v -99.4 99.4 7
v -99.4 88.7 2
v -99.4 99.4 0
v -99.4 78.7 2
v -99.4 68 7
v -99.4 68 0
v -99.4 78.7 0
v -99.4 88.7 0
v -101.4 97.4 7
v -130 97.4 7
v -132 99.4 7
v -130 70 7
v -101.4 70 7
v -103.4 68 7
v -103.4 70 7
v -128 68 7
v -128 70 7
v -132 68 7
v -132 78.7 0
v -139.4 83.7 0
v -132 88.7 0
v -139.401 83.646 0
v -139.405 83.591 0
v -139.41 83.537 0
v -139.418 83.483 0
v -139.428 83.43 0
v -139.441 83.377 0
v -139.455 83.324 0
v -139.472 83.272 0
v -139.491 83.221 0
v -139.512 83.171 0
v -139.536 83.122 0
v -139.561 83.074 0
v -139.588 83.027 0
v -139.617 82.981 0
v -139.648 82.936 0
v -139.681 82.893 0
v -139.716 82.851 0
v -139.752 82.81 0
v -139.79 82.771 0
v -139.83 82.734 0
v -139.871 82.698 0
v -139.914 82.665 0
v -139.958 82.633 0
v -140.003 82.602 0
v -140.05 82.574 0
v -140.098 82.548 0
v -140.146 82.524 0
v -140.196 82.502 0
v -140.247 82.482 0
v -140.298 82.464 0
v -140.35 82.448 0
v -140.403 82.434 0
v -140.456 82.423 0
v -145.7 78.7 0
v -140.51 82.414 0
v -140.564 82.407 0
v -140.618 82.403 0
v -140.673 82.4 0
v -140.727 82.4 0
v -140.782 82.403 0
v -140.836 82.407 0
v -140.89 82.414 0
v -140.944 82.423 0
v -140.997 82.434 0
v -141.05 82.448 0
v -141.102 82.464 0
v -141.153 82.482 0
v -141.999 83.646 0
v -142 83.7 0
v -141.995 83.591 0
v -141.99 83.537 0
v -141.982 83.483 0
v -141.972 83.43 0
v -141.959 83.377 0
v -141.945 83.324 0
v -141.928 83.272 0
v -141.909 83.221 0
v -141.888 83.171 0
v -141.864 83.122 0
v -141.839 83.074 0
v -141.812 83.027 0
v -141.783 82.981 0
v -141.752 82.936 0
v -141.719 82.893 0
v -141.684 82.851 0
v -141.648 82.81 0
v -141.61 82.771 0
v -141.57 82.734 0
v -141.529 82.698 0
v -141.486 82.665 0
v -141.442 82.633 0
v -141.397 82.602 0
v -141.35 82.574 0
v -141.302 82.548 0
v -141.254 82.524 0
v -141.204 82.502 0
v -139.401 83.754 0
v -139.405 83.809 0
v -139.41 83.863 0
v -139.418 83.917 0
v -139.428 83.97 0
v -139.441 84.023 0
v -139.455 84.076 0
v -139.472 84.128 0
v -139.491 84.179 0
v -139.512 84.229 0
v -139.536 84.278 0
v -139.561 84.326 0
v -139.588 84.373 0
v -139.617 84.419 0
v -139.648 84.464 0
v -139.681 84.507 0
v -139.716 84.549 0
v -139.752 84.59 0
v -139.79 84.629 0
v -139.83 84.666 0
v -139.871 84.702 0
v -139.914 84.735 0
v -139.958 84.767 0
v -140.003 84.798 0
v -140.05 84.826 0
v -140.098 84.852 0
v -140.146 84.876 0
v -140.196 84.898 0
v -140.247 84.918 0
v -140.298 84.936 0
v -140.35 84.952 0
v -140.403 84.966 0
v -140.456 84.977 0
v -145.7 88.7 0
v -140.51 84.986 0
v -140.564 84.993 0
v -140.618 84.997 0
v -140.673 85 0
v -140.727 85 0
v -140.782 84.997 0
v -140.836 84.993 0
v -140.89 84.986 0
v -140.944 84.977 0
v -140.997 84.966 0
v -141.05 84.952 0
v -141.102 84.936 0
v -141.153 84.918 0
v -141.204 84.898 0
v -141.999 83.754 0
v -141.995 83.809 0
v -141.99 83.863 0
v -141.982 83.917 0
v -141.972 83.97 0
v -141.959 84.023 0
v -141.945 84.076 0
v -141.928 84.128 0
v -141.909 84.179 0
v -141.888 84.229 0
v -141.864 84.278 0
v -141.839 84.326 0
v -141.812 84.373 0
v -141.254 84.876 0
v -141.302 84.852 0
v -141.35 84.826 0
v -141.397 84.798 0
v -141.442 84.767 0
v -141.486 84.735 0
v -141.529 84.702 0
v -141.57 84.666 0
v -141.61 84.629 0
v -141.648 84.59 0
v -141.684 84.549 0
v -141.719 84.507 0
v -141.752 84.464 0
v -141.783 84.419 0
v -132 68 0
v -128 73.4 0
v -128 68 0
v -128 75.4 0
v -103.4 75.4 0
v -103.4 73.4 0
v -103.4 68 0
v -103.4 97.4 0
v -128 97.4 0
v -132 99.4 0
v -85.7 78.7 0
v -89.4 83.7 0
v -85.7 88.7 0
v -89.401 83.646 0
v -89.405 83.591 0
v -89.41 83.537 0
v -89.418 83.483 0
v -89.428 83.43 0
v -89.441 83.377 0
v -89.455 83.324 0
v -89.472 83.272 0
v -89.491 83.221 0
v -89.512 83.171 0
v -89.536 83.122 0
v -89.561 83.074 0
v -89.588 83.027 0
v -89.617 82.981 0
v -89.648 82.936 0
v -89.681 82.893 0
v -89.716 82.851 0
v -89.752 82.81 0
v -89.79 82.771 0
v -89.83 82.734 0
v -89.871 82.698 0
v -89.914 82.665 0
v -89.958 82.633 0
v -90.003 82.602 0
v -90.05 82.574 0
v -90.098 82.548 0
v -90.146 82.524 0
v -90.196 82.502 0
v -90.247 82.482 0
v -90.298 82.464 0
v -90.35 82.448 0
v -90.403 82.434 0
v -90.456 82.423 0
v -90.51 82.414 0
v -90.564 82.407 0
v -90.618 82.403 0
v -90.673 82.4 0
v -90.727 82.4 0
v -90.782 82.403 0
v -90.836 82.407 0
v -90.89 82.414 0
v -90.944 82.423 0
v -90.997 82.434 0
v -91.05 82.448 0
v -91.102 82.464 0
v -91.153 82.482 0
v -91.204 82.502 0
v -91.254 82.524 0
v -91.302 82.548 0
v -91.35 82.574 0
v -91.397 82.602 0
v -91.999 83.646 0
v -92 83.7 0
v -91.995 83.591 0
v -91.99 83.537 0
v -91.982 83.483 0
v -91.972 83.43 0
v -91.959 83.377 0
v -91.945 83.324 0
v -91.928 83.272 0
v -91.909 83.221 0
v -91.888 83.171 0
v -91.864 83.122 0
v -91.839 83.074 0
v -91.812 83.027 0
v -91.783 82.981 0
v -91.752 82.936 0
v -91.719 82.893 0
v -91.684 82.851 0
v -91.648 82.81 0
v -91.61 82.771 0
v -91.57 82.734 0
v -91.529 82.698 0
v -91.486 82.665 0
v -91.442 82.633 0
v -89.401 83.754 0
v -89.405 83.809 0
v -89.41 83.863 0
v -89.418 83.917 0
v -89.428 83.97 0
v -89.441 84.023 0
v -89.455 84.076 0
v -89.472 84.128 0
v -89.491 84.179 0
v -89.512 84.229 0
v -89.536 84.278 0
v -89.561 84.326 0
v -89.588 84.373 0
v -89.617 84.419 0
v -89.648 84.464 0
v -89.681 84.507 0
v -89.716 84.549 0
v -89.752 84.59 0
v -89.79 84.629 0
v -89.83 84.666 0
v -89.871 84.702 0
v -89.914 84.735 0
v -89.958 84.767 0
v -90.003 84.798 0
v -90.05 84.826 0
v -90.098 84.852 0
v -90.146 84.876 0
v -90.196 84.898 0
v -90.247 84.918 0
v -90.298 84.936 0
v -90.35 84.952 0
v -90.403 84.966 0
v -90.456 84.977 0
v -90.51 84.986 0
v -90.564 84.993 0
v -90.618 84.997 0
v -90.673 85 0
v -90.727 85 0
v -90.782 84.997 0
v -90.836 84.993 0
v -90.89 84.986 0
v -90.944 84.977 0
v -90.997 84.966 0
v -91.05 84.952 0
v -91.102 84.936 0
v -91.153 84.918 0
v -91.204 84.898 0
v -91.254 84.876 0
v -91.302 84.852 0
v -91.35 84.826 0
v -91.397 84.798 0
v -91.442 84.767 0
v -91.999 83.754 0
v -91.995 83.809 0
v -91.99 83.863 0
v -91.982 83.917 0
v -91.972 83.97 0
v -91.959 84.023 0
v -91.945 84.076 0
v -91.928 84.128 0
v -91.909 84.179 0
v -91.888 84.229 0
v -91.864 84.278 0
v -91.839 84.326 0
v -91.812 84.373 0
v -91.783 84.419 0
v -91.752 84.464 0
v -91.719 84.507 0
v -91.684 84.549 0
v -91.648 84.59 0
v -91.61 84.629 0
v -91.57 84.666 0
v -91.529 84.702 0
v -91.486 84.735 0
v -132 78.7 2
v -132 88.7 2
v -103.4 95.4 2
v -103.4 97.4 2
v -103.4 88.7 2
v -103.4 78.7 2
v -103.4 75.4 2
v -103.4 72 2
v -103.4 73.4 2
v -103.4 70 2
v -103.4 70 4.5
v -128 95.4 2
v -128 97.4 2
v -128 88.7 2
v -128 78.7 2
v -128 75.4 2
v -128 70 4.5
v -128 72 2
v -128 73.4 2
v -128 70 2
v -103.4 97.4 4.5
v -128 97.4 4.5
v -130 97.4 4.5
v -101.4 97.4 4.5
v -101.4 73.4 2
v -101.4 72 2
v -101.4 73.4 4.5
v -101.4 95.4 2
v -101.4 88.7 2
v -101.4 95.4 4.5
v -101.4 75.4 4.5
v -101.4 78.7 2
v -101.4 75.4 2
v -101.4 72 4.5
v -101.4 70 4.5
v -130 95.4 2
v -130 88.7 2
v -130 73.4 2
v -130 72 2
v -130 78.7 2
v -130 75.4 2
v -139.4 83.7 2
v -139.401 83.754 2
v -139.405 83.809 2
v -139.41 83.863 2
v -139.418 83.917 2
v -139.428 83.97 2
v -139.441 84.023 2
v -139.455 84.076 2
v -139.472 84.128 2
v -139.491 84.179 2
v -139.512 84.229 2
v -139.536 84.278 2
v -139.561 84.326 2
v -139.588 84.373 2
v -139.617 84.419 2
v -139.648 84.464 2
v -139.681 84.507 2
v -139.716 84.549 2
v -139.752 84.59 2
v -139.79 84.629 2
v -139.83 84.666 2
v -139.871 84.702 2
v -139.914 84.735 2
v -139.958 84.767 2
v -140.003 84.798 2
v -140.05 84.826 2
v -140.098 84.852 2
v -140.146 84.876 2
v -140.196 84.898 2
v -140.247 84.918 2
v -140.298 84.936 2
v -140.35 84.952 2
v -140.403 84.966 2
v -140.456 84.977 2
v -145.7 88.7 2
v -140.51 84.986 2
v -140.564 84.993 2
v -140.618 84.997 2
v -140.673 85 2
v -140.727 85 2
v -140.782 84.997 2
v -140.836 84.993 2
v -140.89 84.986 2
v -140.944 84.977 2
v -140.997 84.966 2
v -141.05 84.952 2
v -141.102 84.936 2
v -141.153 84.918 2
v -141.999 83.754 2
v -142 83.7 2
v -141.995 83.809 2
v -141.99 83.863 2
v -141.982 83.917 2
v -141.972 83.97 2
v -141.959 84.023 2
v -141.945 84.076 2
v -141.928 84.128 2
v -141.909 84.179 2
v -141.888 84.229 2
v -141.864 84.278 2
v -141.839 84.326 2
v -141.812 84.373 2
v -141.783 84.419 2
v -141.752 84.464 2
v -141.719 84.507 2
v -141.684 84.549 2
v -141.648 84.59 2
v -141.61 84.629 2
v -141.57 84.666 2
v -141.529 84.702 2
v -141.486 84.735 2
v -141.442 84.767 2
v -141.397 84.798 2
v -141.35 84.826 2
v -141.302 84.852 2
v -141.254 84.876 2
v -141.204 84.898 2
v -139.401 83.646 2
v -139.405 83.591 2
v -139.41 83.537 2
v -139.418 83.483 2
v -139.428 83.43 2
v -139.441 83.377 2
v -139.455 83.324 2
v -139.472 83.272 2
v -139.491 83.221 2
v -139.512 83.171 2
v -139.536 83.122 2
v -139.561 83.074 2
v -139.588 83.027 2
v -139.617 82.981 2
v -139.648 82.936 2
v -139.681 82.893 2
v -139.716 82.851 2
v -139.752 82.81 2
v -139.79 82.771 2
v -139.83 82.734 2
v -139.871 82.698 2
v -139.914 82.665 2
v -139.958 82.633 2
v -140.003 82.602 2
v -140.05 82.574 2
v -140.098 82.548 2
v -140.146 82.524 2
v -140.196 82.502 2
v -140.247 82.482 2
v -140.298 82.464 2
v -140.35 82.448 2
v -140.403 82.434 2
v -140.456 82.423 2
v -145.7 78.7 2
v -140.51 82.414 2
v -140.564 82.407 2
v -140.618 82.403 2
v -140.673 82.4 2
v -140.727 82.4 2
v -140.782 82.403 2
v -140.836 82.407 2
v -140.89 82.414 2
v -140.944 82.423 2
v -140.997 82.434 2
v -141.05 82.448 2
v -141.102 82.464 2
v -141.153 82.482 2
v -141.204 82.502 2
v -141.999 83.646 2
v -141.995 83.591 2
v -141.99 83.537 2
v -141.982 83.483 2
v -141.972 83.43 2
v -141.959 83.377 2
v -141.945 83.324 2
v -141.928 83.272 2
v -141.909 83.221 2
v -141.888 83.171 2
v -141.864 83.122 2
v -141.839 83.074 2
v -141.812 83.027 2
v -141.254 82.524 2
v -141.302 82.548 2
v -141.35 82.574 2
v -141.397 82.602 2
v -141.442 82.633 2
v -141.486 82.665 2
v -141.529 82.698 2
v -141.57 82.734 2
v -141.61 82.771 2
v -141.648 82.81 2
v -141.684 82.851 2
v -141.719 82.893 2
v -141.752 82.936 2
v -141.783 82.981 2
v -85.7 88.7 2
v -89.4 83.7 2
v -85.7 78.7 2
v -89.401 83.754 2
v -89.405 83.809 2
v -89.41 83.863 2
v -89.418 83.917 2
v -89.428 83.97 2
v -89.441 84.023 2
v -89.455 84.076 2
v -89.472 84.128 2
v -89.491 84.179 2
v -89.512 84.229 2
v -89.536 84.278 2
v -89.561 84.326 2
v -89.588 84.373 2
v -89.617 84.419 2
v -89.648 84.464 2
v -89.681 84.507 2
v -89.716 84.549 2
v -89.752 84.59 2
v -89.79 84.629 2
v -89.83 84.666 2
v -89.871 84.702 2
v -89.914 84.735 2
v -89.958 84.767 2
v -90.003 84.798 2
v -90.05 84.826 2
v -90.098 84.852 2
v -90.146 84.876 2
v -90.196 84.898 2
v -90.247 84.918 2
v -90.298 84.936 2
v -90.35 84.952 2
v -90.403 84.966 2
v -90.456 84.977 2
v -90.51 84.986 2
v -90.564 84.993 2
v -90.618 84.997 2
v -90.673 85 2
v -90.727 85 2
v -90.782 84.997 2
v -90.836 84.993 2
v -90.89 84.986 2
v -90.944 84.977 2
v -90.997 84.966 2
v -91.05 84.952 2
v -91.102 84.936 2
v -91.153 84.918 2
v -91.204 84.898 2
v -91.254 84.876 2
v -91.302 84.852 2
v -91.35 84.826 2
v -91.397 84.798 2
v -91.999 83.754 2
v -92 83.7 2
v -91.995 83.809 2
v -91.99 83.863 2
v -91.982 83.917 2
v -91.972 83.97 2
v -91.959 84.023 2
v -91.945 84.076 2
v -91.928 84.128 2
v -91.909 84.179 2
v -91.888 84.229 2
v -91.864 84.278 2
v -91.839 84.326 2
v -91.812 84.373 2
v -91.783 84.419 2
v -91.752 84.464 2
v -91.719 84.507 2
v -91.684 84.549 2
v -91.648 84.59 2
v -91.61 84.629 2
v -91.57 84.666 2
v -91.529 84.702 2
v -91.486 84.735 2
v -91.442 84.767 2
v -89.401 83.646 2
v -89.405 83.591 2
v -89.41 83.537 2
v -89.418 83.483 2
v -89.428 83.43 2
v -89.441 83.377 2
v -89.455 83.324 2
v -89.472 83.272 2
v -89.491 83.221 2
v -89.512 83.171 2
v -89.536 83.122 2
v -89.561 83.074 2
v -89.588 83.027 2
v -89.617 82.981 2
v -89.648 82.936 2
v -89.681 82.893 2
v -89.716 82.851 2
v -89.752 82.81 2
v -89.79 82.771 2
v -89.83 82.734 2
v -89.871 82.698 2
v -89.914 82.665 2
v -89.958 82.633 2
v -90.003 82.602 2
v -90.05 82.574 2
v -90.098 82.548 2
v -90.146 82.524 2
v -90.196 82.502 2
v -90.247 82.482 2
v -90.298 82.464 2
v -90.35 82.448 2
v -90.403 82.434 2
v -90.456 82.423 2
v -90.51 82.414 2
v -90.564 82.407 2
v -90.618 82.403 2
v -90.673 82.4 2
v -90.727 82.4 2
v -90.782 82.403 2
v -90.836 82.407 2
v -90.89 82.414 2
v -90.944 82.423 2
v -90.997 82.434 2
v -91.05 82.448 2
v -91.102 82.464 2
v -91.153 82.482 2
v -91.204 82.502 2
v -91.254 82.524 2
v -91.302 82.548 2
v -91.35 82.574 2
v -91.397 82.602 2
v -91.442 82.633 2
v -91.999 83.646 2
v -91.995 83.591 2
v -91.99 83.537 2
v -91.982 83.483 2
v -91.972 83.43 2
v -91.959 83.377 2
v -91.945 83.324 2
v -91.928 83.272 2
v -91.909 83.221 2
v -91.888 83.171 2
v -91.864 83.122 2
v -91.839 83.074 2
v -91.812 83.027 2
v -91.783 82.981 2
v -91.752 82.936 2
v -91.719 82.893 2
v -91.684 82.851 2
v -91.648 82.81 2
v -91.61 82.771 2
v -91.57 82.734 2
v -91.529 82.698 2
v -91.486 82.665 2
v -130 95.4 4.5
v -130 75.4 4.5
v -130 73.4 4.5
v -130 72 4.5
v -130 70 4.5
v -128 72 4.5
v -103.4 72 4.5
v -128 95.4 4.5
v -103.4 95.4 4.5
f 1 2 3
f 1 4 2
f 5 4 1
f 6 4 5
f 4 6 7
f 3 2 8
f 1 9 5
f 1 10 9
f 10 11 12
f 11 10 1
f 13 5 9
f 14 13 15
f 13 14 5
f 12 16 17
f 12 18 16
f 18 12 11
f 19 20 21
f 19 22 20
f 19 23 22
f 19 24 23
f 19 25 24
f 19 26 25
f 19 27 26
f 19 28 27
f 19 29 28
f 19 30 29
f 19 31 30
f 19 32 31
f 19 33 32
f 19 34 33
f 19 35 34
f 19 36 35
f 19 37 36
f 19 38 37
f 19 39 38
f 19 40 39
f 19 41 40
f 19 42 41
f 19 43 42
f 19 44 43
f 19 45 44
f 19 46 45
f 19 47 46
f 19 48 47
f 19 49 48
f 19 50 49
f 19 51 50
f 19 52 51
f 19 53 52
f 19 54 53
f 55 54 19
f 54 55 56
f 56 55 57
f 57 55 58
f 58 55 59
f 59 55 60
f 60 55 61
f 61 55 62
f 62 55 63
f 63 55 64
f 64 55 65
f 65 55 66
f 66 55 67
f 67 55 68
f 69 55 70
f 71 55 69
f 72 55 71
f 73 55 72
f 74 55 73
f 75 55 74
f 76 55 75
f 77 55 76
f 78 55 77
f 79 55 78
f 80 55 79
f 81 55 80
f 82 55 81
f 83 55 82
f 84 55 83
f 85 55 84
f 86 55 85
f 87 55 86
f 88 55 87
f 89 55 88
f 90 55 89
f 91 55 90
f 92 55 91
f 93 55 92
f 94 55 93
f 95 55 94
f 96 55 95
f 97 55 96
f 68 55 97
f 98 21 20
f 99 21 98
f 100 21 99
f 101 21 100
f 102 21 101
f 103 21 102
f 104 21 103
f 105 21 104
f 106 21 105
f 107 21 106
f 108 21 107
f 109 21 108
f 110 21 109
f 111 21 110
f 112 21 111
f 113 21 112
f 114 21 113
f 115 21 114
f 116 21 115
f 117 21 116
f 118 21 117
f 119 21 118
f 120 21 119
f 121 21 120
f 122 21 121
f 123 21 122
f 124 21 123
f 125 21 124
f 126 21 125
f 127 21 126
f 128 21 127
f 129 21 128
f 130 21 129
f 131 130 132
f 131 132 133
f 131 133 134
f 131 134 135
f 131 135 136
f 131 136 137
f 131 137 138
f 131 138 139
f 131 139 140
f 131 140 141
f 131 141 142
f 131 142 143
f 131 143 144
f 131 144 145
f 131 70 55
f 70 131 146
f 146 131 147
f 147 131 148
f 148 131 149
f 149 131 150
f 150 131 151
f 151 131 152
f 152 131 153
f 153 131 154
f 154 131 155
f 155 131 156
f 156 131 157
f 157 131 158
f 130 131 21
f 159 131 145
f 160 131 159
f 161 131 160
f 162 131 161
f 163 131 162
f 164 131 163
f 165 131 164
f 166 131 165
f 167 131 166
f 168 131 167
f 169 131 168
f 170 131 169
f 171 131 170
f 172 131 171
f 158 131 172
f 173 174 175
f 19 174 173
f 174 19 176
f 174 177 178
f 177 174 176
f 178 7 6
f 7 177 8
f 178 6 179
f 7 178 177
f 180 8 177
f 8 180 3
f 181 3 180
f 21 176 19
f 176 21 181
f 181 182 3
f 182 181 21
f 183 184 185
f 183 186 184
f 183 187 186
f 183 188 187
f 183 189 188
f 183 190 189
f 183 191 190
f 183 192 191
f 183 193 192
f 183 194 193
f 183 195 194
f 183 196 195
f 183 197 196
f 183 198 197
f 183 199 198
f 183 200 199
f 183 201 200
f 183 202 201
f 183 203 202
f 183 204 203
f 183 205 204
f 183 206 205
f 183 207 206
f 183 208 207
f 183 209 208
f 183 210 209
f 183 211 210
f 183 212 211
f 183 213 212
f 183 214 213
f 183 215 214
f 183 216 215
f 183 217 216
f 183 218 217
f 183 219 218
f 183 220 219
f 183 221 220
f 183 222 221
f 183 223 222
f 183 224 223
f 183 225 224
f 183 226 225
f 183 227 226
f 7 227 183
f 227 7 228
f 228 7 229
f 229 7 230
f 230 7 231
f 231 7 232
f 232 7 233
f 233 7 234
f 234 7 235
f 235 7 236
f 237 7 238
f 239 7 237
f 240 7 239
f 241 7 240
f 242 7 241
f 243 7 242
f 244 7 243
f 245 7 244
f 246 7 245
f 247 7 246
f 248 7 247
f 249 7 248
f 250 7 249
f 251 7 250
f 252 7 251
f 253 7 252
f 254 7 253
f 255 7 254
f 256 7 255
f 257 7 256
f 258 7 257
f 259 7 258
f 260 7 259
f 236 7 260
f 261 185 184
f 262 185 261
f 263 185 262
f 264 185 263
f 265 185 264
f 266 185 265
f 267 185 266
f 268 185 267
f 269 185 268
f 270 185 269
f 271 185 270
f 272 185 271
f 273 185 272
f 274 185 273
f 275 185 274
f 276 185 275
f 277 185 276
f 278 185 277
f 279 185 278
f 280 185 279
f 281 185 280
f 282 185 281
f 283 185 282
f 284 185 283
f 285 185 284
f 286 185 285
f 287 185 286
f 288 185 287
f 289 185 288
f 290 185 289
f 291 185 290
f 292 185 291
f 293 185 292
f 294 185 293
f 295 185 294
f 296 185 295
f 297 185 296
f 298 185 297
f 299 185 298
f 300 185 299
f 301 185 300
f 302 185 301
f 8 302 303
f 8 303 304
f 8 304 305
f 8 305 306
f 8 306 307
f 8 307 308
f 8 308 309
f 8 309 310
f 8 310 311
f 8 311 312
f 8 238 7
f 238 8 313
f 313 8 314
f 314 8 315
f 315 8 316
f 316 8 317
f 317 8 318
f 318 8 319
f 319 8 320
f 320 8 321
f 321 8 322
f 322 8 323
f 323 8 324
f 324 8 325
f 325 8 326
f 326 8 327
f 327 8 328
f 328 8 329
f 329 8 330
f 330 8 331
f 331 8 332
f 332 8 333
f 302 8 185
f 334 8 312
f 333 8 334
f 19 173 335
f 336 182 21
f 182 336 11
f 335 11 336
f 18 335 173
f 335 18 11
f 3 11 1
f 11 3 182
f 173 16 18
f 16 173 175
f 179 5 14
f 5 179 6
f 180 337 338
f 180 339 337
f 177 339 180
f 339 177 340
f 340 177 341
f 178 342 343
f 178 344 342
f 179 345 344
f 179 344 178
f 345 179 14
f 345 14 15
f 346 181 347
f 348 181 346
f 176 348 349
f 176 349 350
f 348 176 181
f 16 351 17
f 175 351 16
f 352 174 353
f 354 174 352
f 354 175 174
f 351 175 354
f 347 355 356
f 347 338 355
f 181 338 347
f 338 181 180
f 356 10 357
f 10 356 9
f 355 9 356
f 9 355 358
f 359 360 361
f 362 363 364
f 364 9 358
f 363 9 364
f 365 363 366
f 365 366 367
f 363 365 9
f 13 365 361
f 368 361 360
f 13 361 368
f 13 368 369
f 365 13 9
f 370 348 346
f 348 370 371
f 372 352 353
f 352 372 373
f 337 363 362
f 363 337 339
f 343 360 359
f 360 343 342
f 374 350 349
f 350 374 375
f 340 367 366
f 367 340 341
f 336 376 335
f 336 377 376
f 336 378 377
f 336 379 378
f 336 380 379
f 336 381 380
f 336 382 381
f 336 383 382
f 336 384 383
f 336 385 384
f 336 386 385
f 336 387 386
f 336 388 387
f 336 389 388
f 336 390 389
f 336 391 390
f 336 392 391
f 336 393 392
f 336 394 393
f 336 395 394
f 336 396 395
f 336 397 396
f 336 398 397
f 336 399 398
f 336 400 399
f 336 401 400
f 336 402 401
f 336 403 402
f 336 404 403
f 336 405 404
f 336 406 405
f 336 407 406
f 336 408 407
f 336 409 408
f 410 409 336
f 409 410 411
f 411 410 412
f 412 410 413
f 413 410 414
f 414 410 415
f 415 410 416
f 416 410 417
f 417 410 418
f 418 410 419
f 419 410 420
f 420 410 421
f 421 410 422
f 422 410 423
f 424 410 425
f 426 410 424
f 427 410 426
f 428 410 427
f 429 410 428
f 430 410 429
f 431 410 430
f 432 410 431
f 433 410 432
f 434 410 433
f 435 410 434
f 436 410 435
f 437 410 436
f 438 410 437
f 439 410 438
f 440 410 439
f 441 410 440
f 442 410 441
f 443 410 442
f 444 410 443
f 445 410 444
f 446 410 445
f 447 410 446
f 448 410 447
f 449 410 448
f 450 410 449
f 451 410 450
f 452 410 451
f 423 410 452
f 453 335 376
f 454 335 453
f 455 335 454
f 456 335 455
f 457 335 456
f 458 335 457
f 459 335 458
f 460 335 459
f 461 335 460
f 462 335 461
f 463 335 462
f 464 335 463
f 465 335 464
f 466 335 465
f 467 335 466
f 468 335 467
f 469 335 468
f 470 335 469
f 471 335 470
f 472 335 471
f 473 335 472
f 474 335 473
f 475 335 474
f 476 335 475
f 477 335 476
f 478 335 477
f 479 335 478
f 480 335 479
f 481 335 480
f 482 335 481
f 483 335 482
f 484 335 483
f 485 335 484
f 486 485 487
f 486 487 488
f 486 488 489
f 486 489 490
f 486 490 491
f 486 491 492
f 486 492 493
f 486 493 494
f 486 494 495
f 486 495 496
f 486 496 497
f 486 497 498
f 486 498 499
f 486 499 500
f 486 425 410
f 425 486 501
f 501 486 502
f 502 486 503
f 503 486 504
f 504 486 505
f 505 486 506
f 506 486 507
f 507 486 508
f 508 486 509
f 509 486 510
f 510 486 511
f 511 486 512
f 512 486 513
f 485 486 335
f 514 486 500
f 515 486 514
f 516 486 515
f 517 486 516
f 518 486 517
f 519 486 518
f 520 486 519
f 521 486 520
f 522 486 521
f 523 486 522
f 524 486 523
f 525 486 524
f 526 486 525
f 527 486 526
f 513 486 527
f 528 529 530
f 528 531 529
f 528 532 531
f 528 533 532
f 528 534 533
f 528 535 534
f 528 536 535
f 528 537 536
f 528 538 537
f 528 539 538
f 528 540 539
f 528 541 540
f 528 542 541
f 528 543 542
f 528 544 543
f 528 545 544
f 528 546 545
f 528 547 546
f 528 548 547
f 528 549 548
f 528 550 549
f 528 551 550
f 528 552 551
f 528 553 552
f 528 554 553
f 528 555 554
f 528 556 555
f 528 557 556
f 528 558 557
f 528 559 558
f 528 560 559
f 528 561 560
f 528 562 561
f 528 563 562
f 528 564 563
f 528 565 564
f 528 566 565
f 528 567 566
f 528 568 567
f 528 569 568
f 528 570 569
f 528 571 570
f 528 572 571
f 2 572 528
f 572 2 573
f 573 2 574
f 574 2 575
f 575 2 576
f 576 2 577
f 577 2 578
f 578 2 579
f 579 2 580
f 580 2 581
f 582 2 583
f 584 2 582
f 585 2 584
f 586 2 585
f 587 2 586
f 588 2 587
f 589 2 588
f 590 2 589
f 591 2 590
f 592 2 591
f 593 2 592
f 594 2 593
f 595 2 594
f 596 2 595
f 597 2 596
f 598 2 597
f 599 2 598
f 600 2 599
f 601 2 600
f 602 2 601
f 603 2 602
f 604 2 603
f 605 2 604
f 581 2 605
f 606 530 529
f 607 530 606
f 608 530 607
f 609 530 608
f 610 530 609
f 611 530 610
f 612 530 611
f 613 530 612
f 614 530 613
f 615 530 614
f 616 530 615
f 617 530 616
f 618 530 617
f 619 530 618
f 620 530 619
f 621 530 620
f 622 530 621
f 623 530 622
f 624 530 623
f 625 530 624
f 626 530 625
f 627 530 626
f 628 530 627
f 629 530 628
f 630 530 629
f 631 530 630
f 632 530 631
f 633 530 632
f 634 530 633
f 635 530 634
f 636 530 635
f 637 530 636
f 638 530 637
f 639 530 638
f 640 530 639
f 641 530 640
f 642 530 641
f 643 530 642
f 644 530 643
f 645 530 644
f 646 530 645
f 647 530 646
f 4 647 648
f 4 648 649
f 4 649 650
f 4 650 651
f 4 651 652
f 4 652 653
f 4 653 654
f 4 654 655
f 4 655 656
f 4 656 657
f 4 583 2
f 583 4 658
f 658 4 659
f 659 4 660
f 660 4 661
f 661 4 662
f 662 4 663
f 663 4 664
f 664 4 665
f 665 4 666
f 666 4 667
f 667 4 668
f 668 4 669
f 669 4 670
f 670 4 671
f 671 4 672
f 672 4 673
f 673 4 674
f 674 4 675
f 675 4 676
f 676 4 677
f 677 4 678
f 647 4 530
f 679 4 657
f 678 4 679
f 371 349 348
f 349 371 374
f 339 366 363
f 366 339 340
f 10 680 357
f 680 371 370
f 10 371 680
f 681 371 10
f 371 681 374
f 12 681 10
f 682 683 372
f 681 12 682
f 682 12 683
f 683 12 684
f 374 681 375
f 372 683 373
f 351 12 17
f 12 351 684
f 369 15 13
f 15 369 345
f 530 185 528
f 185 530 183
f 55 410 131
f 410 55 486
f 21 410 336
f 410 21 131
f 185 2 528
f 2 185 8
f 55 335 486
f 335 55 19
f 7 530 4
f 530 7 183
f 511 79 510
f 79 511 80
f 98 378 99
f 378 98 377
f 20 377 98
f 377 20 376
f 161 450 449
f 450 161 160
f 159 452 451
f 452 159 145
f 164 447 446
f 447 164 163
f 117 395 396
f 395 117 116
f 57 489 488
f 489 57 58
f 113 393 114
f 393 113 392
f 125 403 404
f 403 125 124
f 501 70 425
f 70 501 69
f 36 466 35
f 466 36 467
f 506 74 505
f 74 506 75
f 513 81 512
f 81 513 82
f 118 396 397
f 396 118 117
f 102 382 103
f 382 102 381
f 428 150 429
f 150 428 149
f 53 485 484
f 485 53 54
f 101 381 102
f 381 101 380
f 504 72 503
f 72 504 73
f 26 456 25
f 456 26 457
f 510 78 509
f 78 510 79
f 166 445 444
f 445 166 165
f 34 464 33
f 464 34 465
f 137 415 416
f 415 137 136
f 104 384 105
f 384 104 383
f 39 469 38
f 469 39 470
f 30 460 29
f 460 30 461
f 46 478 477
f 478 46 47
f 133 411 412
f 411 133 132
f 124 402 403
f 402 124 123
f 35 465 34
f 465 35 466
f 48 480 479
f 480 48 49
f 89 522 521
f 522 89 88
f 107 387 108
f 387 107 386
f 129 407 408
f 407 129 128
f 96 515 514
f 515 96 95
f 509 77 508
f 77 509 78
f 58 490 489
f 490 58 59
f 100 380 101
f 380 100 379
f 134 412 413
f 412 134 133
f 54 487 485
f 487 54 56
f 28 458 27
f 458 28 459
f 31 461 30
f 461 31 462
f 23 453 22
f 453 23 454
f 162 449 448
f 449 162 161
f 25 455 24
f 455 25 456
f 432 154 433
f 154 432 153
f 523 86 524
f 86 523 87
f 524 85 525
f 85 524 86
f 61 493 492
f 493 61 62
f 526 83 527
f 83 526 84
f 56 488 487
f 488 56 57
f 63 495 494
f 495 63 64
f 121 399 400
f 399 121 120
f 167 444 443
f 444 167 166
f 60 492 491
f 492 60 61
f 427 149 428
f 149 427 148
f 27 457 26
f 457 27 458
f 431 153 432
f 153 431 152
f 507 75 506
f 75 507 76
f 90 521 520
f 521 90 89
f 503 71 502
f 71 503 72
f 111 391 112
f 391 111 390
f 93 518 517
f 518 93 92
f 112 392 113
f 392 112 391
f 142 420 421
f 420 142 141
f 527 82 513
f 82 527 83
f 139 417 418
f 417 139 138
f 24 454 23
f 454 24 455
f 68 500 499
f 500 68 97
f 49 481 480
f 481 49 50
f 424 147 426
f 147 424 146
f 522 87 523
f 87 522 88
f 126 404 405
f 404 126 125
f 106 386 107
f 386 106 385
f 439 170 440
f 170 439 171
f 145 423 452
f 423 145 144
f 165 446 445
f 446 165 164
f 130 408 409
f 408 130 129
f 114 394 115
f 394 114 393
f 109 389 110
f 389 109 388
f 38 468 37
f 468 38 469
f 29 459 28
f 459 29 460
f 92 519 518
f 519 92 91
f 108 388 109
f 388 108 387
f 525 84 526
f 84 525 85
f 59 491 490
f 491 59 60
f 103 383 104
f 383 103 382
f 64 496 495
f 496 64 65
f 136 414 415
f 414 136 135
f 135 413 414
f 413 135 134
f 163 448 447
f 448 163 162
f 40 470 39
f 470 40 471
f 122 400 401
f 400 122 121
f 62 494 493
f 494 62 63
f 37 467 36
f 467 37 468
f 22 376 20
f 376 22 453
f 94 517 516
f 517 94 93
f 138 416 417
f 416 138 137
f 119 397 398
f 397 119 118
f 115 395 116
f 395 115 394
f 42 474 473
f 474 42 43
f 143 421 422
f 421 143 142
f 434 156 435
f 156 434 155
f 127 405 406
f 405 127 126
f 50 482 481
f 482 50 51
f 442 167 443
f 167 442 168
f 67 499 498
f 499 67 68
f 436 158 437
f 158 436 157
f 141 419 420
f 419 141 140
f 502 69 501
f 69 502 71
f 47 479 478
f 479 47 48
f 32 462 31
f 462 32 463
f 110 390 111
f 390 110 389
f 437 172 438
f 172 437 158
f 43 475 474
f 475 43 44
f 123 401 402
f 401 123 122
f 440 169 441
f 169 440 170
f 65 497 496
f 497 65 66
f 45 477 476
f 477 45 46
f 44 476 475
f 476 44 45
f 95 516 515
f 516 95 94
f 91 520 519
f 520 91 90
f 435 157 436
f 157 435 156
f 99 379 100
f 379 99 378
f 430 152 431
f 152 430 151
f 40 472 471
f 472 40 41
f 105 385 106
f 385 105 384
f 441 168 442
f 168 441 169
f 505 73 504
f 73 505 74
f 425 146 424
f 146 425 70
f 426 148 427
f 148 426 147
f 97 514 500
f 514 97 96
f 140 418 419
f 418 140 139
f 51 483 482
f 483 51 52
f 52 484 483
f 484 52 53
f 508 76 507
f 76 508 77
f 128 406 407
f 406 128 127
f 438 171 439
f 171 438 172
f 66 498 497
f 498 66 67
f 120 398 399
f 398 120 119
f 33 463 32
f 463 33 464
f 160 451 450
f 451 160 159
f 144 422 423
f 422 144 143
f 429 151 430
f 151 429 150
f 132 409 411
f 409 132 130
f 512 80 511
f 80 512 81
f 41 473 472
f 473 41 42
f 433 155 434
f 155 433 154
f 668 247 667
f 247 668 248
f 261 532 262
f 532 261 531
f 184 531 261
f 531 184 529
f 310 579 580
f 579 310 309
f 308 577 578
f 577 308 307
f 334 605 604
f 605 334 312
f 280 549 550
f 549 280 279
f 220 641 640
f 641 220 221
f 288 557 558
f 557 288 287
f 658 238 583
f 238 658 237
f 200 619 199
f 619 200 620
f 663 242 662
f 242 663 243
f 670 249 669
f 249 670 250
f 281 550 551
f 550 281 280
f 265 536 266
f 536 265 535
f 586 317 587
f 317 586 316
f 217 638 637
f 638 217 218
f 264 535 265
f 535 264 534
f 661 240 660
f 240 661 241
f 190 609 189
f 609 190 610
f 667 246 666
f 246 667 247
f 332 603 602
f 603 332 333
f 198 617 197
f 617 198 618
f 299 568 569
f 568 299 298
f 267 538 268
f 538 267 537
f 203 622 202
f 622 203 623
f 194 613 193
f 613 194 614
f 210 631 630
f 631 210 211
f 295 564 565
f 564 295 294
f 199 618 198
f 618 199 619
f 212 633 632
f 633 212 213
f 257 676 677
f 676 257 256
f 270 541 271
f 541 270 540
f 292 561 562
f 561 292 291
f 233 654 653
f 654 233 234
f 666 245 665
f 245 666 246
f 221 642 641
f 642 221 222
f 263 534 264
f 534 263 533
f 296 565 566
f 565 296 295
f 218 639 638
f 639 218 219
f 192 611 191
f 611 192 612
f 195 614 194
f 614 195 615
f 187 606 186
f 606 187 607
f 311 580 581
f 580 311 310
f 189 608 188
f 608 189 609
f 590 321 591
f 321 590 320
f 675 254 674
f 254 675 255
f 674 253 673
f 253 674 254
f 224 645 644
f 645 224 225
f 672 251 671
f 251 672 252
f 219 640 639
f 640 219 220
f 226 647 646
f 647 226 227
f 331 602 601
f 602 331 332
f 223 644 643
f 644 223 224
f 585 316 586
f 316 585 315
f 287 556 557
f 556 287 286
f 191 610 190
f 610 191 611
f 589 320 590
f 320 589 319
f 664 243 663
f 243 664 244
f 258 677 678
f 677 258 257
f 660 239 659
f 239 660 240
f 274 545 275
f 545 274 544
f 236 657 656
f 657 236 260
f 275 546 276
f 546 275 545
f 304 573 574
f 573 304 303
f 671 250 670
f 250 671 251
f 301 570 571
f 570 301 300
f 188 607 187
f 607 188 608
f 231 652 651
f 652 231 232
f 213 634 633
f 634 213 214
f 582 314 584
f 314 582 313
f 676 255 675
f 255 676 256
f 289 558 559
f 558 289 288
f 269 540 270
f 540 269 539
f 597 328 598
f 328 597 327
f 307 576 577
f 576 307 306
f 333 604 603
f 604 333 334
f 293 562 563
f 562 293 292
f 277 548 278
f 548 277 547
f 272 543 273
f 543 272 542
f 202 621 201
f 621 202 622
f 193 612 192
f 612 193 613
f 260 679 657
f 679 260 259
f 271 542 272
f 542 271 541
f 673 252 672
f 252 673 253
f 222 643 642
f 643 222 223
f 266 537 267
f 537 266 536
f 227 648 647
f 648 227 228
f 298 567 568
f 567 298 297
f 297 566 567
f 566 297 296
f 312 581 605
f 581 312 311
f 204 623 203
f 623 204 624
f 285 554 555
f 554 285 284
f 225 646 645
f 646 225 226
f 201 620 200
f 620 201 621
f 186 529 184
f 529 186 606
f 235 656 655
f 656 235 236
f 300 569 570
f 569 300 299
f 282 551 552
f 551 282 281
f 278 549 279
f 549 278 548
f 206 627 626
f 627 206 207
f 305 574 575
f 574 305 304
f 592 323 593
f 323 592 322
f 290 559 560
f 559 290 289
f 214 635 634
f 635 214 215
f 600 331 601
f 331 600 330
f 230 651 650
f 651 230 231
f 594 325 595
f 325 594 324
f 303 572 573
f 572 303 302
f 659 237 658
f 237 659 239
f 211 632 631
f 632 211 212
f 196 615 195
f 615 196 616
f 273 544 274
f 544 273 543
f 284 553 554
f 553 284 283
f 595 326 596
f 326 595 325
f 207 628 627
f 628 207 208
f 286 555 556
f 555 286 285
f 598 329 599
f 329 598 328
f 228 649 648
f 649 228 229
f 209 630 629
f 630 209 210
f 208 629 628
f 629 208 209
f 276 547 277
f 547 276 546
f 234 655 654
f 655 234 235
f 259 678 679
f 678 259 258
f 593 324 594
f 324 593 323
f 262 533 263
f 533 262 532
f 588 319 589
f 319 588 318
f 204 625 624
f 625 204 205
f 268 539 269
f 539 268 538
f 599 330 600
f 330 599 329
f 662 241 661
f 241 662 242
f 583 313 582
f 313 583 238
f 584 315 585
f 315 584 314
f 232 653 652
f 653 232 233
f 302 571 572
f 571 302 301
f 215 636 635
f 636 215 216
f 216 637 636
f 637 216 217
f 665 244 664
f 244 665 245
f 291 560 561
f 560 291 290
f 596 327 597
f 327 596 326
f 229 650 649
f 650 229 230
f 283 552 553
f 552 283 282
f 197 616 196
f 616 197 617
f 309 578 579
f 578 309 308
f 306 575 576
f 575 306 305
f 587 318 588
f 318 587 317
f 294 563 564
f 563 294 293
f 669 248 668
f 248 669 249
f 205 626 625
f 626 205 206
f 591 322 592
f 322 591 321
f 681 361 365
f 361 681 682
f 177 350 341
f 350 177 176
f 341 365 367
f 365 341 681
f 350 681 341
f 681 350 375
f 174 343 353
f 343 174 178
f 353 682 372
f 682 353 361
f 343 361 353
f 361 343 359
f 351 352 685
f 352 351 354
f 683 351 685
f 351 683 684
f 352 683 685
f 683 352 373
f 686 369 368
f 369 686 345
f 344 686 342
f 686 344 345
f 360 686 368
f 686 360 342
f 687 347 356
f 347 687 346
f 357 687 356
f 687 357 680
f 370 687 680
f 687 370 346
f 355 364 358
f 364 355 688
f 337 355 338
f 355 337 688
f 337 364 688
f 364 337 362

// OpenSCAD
//$fn=50;
$fn=150;

module case(
bottomThickness,
wallThickness,
// inner size
width,
depth,
height
) {
  difference() {
    minkowski() {
      cube([width,depth,height]);
      cylinder(r=2,h=bottomThickness);
    }
    translate([0,0,bottomThickness]) {
      cube([width,depth,height]);
    };
  }
}

/*
slotted hole
*/
module slottedHole(action="all", diameter=6, length=10, height=1, border=2, angle=0) {
  rotate(a=angle) {
    if (action=="all") {
    difference() {
      slottedHoleBase(diameter+2*border, length, height);
      slottedHoleBase(diameter, length, height);
    };
};
    if (action=="add") {
      slottedHoleBase(diameter+2*border, length, height);
    };
    if (action=="remove") {
      slottedHoleBase(diameter, length, height);
    };
  };
};

module slottedHoleBase(diameter=5, length=10, height=1) {
  cylinder(r=diameter/2, h=height);
  translate([-diameter/2, 0, 0]) {
    cube([diameter, length, height]);
  };
  translate([0, length, 0]) {
    cylinder(r=diameter/2, h=height);
  };    
};

module plate(width, depth, bottomThickness=2, elbow) {
  cube([width, depth, bottomThickness]);
  translate([0, depth/2, 0]) {
    resize(newsize=[2*elbow, depth, bottomThickness]) {
      cylinder(r=depth/2, h=bottomThickness);
    };
  };
  translate([width, depth/2, 0]) {
    resize(newsize=[2*elbow, depth, bottomThickness]) {
      cylinder(r=depth/2, h=bottomThickness);
    };
  };
};

module bottomplate(width,depth,bottomThickness=2) {    
  difference() {
    union() {
      plate(width=width, depth=depth, bottomThickness=2, elbow=19);
      installationHoles(action="add", width=width, depth=depth);
    };
    installationHoles(action="remove", width=width, depth=depth);
  };
  screwBoltCase(width,depth,bottomThickness);
  translate([50, 2, 2]) {
    screwBoltRelais();
  };
  translate([50, 2, 2]) {
    pcbSupport();
  };
  translate([0, 0, 2]) {
    cableEntry();
  };
};

module installationHoles(action="all", width, depth) {
  holeDiameter=4;
  holeLength=10;
  holeHeight=4;
  holeBorder=2;
  xdif=holeDiameter/2+holeBorder;

  // bottom left
  translate([-xdif, 6, 0]) {
  slottedHole(action=action, diameter=holeDiameter, length=holeLength, height=holeHeight, border=holeBorder, angle=30);
  };
  // top left
  translate([-xdif, depth-6, 0]) {
  slottedHole(action=action, diameter=holeDiameter, length=holeLength, height=holeHeight, border=holeBorder, angle=180-30);
  };
  // bottom right
  translate([width+xdif, 6, 0]) {
  slottedHole(action=action, diameter=holeDiameter, length=holeLength, height=holeHeight, border=holeBorder, angle=-30);
  };
  // top right
  translate([width+xdif, depth-6, 0]) {
  slottedHole(action=action, diameter=holeDiameter, length=holeLength, height=holeHeight, border=holeBorder, angle=180+30);
  };
  // middle left
  translate([-xdif, (depth/2)-holeLength/2, 0]) {
  slottedHole(action=action, diameter=holeDiameter, length=holeLength, height=holeHeight, border=holeBorder, angle=0);
  };
  // middle right
  translate([width+xdif, (depth/2)-holeLength/2, 0]) {
  slottedHole(action=action, diameter=holeDiameter, length=holeLength, height=holeHeight, border=holeBorder, angle=0);
  };
};

module screwBoltCase(width, depth, bottomThickness) {
  diameterBolt=10;
  diameterScrew=2.2;
  height=20;
  xdif=diameterBolt/2+9;
  translate([-xdif, depth/2, 0]) {
    screwBolt(diameterBolt=diameterBolt, diameterScrew=diameterScrew, height=height);
  };  
  translate([xdif+width, depth/2, 0]) {
    screwBolt(diameterBolt=diameterBolt, diameterScrew=diameterScrew, height=height);
  };  
};

module screwGap(action="add", diameterBolt, diameterScrew, height) {
  diffH=5;
  if (action=="add") {
    difference() {
      cylinder(r=diameterBolt/2, h=height);
      translate([0,0,height-diffH]) {
        cylinder(r=3, h=diffH);
      };
      cylinder(r=diameterScrew/2, h=height-diffH);
    };
  };
  if (action=="remove") {
    cylinder(r=diameterBolt/2, h=height);
  };
};

/*
* heightTop - height of case top
*/
module screwGapCase(action="add", width, depth, heightTop) {
  diameterBolt=10;
  diameterScrew=2.2;
  height=heightTop+3;
  xdif=diameterBolt/2+9;
  
  translate([-xdif, depth/2, 0]) {
    screwGap(action=action, diameterBolt=diameterBolt, diameterScrew=diameterScrew, height=height);
  };  
  translate([xdif+width, depth/2, 0]) {
    screwGap(action=action, diameterBolt=diameterBolt,diameterScrew=diameterScrew, height=height);
  };
};

module screwBoltRelais() {
  diameterBolt=8;
  diameterScrew=2.2;
  height=5;
     
  zz=25.4; // Zoll

  // set position with origin pcb
  translate([.2*zz, .95*zz, 0]) {
  translate([0, 0, 0]) {
    screwBolt(diameterBolt=diameterBolt, diameterScrew=diameterScrew, height=height);
  };
  translate([1.925*zz, 0, 0]) {
    screwBolt(diameterBolt=diameterBolt, diameterScrew=diameterScrew, height=height);
  };
  translate([0, .55*zz, 0]) {
    screwBolt(diameterBolt=diameterBolt, diameterScrew=diameterScrew, height=height);
  };
  translate([1.925*zz, .55*zz, 0]) {
    screwBolt(diameterBolt=diameterBolt, diameterScrew=diameterScrew, height=height);
  };
  };
};

module pcbSupport() {
  h=5;
  translate([8, 10, 0]) {
    cube([6,4,h]);
  };
  translate([10, 53, 0]) {
    cube([70,3,h]);
  };
  translate([68, 8, 0]) {
    cube([5,2,h]);
  };
  translate([73, 20, 0]) {
    cube([2,6,h]);
  };
};

module cableEntry() {
  diameterScrew=2.2;
  depth=60;
  h=5;
  translate([0, 0, 0]) {
    cube([3,depth,h+2]);
  };
  translate([50-3, 0, 0]) {
    cube([3,depth,h+2]);
  };
  for(i = [0:2]) {
    translate([3, i*25, 0]) {
    difference() {
      cube([44, 10, h]);
      for(i = [1:4]) {
        translate([i*10-3, 5, 0]) {
          cylinder(r=diameterScrew/2, h=5);
        };
      };
    };
    };
  };
};

module cableMount() {
  gap=0.2;
    
  wThick = 2; // wall thickness
  cableGapW = 44-2*gap;
  cableGapD = wThick;
  cableGapH = 20;
  cableDiameter = 10;
  bottomHeight = 1;
  screwDiameter = 2.3;

  difference() {
  union() {
  // entry wall
  translate([0, 0, bottomHeight]) {
    cube([cableGapW, cableGapD, cableGapH]);
  };

  // plate
  translate([0,0+gap,bottomHeight]) {
    cube([cableGapW,60-2*gap,wThick]);
  };
  // bottom plate 1
  translate([0,10+gap,0]) {
    cube([cableGapW,15-2*gap,bottomHeight]);
  };
  // bottom plate 2
  translate([0,10+15+10+gap,0]) {
    cube([cableGapW,15-2*gap,bottomHeight]);
  };

  translate([0,10,bottomHeight+wThick]) {
  cableClamp(
    cableDiameter=6,
    screwDiameter=2.3,
    screwDistance=11,
    width=16,
    depth=4,
    height=7,
    ingress=1);
  };
  
  translate([11-gap,14,bottomHeight+wThick]) {
  cableClamp(
    cableDiameter=8,
    screwDiameter=2.3,
    screwDistance=13,
    width=18,
    depth=4,
    height=7,
    ingress=1);
  };
  
  translate([cableGapW-20,10,bottomHeight+wThick]) {
  cableClamp(
    cableDiameter=10,
    screwDiameter=2.3,
    screwDistance=15,
    width=20,
    depth=4,
    height=7,
    ingress=1);
  };
  }; // end union
  
  // left cable
  translate([8,0,wThick+bottomHeight+cableDiameter/2+1]) {
    rotate([-90,0,0]) {
       cylinder(h=cableGapD, r=cableDiameter/2);
    };
  };
  // middle cable
  translate([20-gap,0,wThick+bottomHeight+cableDiameter/2+1]) {
    rotate([-90,0,0]) {
       cylinder(h=cableGapD, r=cableDiameter/2);
    };
  };
  // right cable
  translate([cableGapW-10,0,wThick+bottomHeight+cableDiameter/2+1]) {
    rotate([-90,0,0]) {
       cylinder(h=cableGapD, r=cableDiameter/2);
    };
  };
  
  // holes for screws
  for(i = [0:2]) {
    translate([0-gap, i*25, bottomHeight]) {
      for(i = [1:4]) {
        translate([i*10-3, 5, 0]) {
          cylinder(r=(screwDiameter+.3)/2, h=wThick);
        };
      };
    };
  };
  
  }; // end difference
};

module screwBolt(diameterBolt, diameterScrew, height) {
  difference() {
    cylinder(r=diameterBolt/2, h= height);
    cylinder(r=diameterScrew/2, h= height);
  };
};

/*
* Mittelteil
*/
module bodyMiddle(width, depth, height, innerheight) {
  wThick = 2; // wall thickness
  gap = 0.15;

  cableGapW = 44;
  cableGapD = wThick;
  cableGapH = 20;
    
  difference() {
    plate(width, depth+2*wThick+2*gap, height, 19+wThick+gap);
    translate([0, wThick, 0]) {
      plate(width, depth+2*gap, innerheight, 19+gap);
    };
    translate([3, 0, 5]) {
      cube([cableGapW, cableGapD, cableGapH]);
    };
  };
};

module displayCover() {
  dispWidth = 28.6;
  dispDepth = 27.4;
  dispHeight = 5;
  thick = 2;
  screwDist = 50;
  screwDepth = 10;
  
  // body  
  difference() {
    translate([-thick, -thick, 0]) {
      cube([dispWidth+2*thick, dispDepth+2*thick, dispHeight+thick]);
    };
    translate([dispWidth/2-(dispWidth-2*thick)/2, -thick, 0]) {
      cube([dispWidth-2*thick, dispDepth+2*thick, dispHeight+thick]);      
    };
    translate([0, 0, thick]) {
      cube([dispWidth, dispDepth, dispHeight]);
    };
  };
  // display support 2.2
  translate([0, 0, thick]) {
    cube([thick, thick, thick+.5]);
  };
  translate([dispWidth-thick, 0, thick]) {
    cube([thick, thick, thick+.5]);
  };
  translate([0, dispDepth-thick, thick]) {
    cube([thick, thick, thick+.5]);
  };
  translate([dispWidth-thick, dispDepth-thick, thick]) {
    cube([thick, thick, thick+.5]);
  };
  // screw support
  difference() {
    translate([dispWidth/2-(screwDist+screwDepth)/2,   dispDepth/2-(screwDepth)/2, 0]) {
      cube([screwDist+screwDepth, screwDepth, thick]);
    };
    translate([dispWidth/2-screwDist/2,   dispDepth/2, 0]) {
      cylinder(r=2.6/2, h=thick);
    };
    translate([dispWidth/2+screwDist/2,   dispDepth/2, 0]) {
      cylinder(r=2.6/2, h=thick);
    };
  };
};

module displayCover2() {
  dispWidth = 28.6;
  dispDepth = 27.4;
  dispHeight = 5;
  thick = 2;
  screwDist = 50;
  screwDepth = 10;
  
  // body  
  difference() {
    translate([-thick, -thick, 0]) {
      cube([dispWidth+2*thick, dispDepth+2*thick, dispHeight+thick]);
    };
    translate([dispWidth/2-(dispWidth-2*thick)/2, -thick, 0]) {
      cube([dispWidth-2*thick, dispDepth+thick, dispHeight+thick]);      
    };
    translate([0, 0, thick]) {
      cube([dispWidth, dispDepth, dispHeight]);
    };
  };
  translate([0, dispDepth+thick-26, 0]) {
    cube([dispWidth, thick, thick+thick+.5]);
  };
  // display support 2.2
  translate([0, 0, thick]) {
    cube([thick, thick, thick+.5]);
  };
  translate([dispWidth-thick, 0, thick]) {
    cube([thick, thick, thick+.5]);
  };
  translate([0, dispDepth-thick, thick]) {
    cube([thick, thick, thick+.5]);
  };
  translate([dispWidth-thick, dispDepth-thick, thick]) {
    cube([thick, thick, thick+.5]);
  };
  // screw support
  difference() {
    translate([dispWidth/2-(screwDist+screwDepth)/2,   dispDepth/2-(screwDepth)/2, 0]) {
      cube([screwDist+screwDepth, screwDepth, thick]);
    };
    translate([dispWidth/2-(dispWidth-2*thick)/2, -thick, 0]) {
      cube([dispWidth-2*thick, dispDepth+thick, dispHeight+thick]);
    };
    translate([dispWidth/2-screwDist/2,   dispDepth/2, 0]) {
      cylinder(r=2.6/2, h=thick);
    };
    translate([dispWidth/2+screwDist/2,   dispDepth/2, 0]) {
      cylinder(r=2.6/2, h=thick);
    };
  };
};

/*
* visible Display 33.6 x 17.3
*/
module displayMount(width, depth) {
  mWidth = width;
  mDepth = depth;
  mHeight = 2;
  mockWidth = 5;
  mockWidth2 = 17; // with holes
  mockBottomWidth2 = 5; // bottom part of mock with holes
  mockDepth = 11;
  mockGap = 24;
  mockGap2 = 1.5; // depth bottom top
  diameterHole = 2.6;
  mockHeight = 1.6;

  // base
  difference() {
    cube([mWidth, mDepth, mHeight]);
    // top
    for(i = [0:(mWidth/20)+1]) {
      translate([i*20-10, 0, 0]){
        cube([13, mockGap2, mHeight]);
      };
    };
    translate([0, 0, mockHeight]){
      cube([mWidth, mockGap2, mHeight-mockHeight]);
    };
    // bottom
    for(i = [0:(mWidth/20)+1]) {
      translate([i*20-10, mDepth-mockGap2, 0]){
        cube([13, mockGap2, mHeight]);
      };
    };
    translate([0, mDepth-mockGap2, mockHeight]){
      cube([mWidth, mockGap2, mHeight-mockHeight]);
    };
    // low ground for display
    translate([width/2, depth/2, mHeight/2+.5]){
    translate([0, -(25-32/2), 0]){
      cube([34, 32, mHeight-.5], center=true);
    };
    // visible Display
    translate([0, -(25-32/2)-(27.4/2-(4+14.8/2)), -.5]){
      cube([25.6, 14.8, 2], center=true);      
    };
    // screw Display cover
    translate([0, -(25-32/2), 0]){
      cube([60, 10, mHeight-.5], center=true);
    };
    // buttons
    translate([0, 14, 0]){
      cube([58, 22, mHeight-.5], center=true);      
    };
    };
  };
  
  // screw Display cover
  translate([width/2, depth/2, .5]){
    // Display
    translate([20, -(25-32/2)-5, 0]){
      difference() {
        cube([10, 10, 5], center=false);
        translate([5,5,0]) {
        cylinder(r=2.3/2, h=5);
      };
      };
    };
    translate([-30, -(25-32/2)-5, 0]){
      difference() {
        cube([10, 10, 5], center=false);
        translate([5,5,0]) {
        cylinder(r=2.3/2, h=5);
      };
      };
    };
    // Buttons
    translate([58.4/2-10/2, 1, 0]){
      difference() {
        cube([10, 10, 9], center=false);
        translate([5,5,0]) {
        cylinder(r=2.3/2, h=9);
      };
      };
    };
    translate([-58.4/2-10/2, 1, 0]){
      difference() {
        cube([10, 10, 9], center=false);
        translate([5,5,0]) {
        cylinder(r=2.3/2, h=9);
      };
      };
    };
  };

  // display cubes
  translate([width/2, depth/2-(25-32/2), .5]){
    translate([28.6/2-2, 27.4/2-2, 0]){
      cube([2, 2, 1.6], center=false);
    };
    translate([-28.6/2, 27.4/2-2, 0]){
      cube([2, 2, 1.6], center=false);
    };
    translate([28.6/2-2, -27.4/2, 0]){
      cube([2, 2, 1.6], center=false);
    };
    translate([-28.6/2, -27.4/2, 0]){
      cube([2, 2, 1.6], center=false);
    };
  };

  // right mock (no screws)
  // first
  translate([-mockWidth, mDepth/2+(mockGap/4+mockGap/2), 0]) {
    cube([mockWidth, mDepth/2-(mockGap/4+mockGap/2)-mockGap2, mHeight]);
  };
  // middle
  translate([-mockWidth, mDepth/2-mockDepth/2, 0]) {
    cube([mockWidth, mockDepth, mHeight]);
  };
  // last
  translate([-mockWidth, mockGap2, 0]) {
    cube([mockWidth, mDepth/2-(mockGap/4+mockGap/2)-mockGap2, mHeight]);
  };

  // left mock (with screw holes)
  translate([mWidth-mockWidth, 0, mHeight]) {
    difference() {
      translate([0, 2, 0]) {
        cube([mockWidth+mockWidth2, mDepth-4, mHeight]);
      };
      // first hole
      translate([mockWidth+mockWidth2-mockBottomWidth2/2, mDepth/2-mockGap, 0]) {
        cylinder(r=diameterHole/2, h=mHeight);
      };
      // middle hole
      translate([mockWidth+mockWidth2-mockBottomWidth2/2, mDepth/2, 0]) {
        cylinder(r=diameterHole/2, h=mHeight);
      };
      // last hole
      translate([mockWidth+mockWidth2-mockBottomWidth2/2, mDepth/2+mockGap, 0]) {
        cylinder(r=diameterHole/2, h=mHeight);
      };
    };
  };
  
  // todo:
  // display gap
  // display distance bolt  
  // display screw bolt
  // button screw bolt

  // back cover for display
};

module uiMountHolder(displayW, displayD, gap) {
  thick = 2; // holder thickness (top / bottom)
  thick2 = 5; // holder thickness (left / right)
  height = 6; // general height
  dist2glass = 2.5;
  diameterScrew=2.2;
  
  // top
  translate([0, displayD+gap-thick, -height]) {
    difference() {
      cube([displayW, thick, height-dist2glass]);
      for(i = [0:displayW/20]) {
        translate([i*20, 0, 0]){
          cube([10, thick, height-dist2glass]);
        };
      };
    };
  };
  // bottom
  translate([0, -gap, -height]) {
    difference() {
      cube([displayW, thick, height-dist2glass]);
      for(i = [0:displayW/20]) {
        translate([i*20, 0, 0]){
          cube([10, thick, height-dist2glass]);
        };
      };
    };
  };
  // left
  translate([-(thick2+10), -gap, -dist2glass]) {
    difference() {
      cube([thick2, displayD+2*gap, dist2glass]);
      for(i = [0:displayD/24]) {
        translate([thick2/2, i*24+6+gap, 0]) {
          cylinder(r=diameterScrew/2, h=dist2glass);
        };
      };
      for(i = [0:displayD/24-1]) {
        translate([0, i*24+12+gap, 0]){
          cube([thick2, 12, dist2glass]);
        };
      };
    };
  };
  // right
  translate([displayW, -gap, -height]) {
    difference() {
      cube([thick2, displayD+2*gap, height]);
      for(i = [0:displayD/24]) {
        translate([0, i*24+gap, height-dist2glass]){
          cube([thick2, 12, dist2glass]);
        };
      };
    };
  };
};

/*
* body
* body border
* screw holes
* display gap
* ui mount
*/
module bodyTop(width, depth, height){
  wThick1 = 2; // wall thickness
  wThick2 = 1.5; // border wall thickness
  gap = 0.15;
  borderH = 3; // border outer height
  borderInnerH = 8; // border inner height
  heightBody = height+borderH;

  displayW = 96; // display width
  displayD = 56; // display depth
  displayB = 2; // display border

  // body + border
  difference() {
    // body
    plate(width, depth+2*wThick1+2*gap, heightBody, 19+wThick1+gap);
    // inner gap
    translate([0, wThick1+wThick2, 0]) {
      plate(width, depth+2*gap-2*wThick2, heightBody-wThick1, 19+gap-wThick2);   
    };
    // inner border gap
    translate([0, wThick1, borderInnerH]) {
      plate(width, depth+2*gap, heightBody-(borderInnerH+wThick1), 19+gap);
    };
    // outer border gap
    difference() {
      plate(width, depth+2*wThick1+2*gap, borderH, 19+wThick1+gap);
      translate([0, wThick1, 0]) {
        plate(width, depth+2*gap, borderH, 19+gap);
      };
    };
    // display gap, smaller gap
    translate([width/2-displayW/2, wThick1+gap+displayB, heightBody-wThick1]) {
        cube([displayW, displayD, wThick1]);
    };
    // display gap, bigger gap
    translate([width/2-(displayW+2*displayB)/2, wThick1, heightBody-wThick1]) {
        cube([(displayW+2*displayB), (displayD+2*displayB)+2*gap, wThick1-.5]);
    };
    // screw holes remove
    translate([0, wThick1+gap, 0]) {
      screwGapCase(action="remove", width=width, depth=depth, heightTop=height);
    };
  };
  // screw holes add
  translate([0, wThick1+gap, 0]) {
    screwGapCase(action="add", width=width, depth=depth, heightTop=height);
  };
  // ui mount holder
  translate([width/2-(displayW+2*displayB)/2, wThick1+gap, heightBody-wThick1]) {
    uiMountHolder(displayW=displayW+2*displayB, displayD=displayD+2*displayB, gap=gap);
  };
};

module cableClamp(
cableDiameter,
screwDiameter,
screwDistance,
width,
depth,
height,
ingress=0 // ingress of cable - 0 .. half cable
) {
    if (cableDiameter==undef) {
        echo("cableDiameter is not set.");
        cableDiameter=10;
    };
    if (screwDiameter==undef) echo("screwDiameter is not set.");
    screwDistance= (screwDistance==undef) ? 2*cableDiameter:screwDistance;
    width= (width==undef) ? 3*cableDiameter : width;
    depth= (depth==undef) ? 2*screwDiameter : depth;
    height= (height==undef) ? .75*cableDiameter : height;
    
    difference() {
        // body
        cube([width,depth,height]);
        
        // cable
		rotate([90,0,0]) {
        translate([width/2,height-ingress,-depth]) {
            cylinder(h=depth, r=cableDiameter/2);
        };
        };
        // cable bay
        translate([width/2-cableDiameter/2,0,height-ingress]) {
            cube([cableDiameter,depth,ingress]);
        };
        // right screw
        translate([width/2+screwDistance/2,depth/2,0]) {
            cylinder(h=height, r=screwDiameter/2);
        };
        // left screw
        translate([width/2-screwDistance/2,depth/2,0]) {
            cylinder(h=height, r=screwDiameter/2);
        };
    };
};

module cableClamp1() {
  cableClamp(
    cableDiameter=6,
    screwDiameter=2.3,
    screwDistance=11,
    width=16,
    depth=4,
    height=5,
    ingress=-1);
};
  
module cableClamp2() {
  cableClamp(
    cableDiameter=8,
    screwDiameter=2.3,
    screwDistance=13,
    width=18,
    depth=4,
    height=5,
    ingress=-1);
};
  
module cableClamp3() {
  cableClamp(
    cableDiameter=10,
    screwDiameter=2.3,
    screwDistance=15,
    width=20,
    depth=4,
    height=5,
    ingress=-1);
};


module main() {
width = 85+50;
depth = 60;
height = 40;
wallThickness = 2;

bottom = false;
middle = false;
top = false;
uiMount = false;
displayCover = false;
displayCover2 = false;
cableMount = false;
//
//bottom = true;
//middle = true;
//top = true;
//uiMount = true;
//displayCover = true;
displayCover2 = true;
//cableMount = true;
//cableClamp1();
//cableClamp2();
//cableClamp3();

// bottom
if (bottom) {
bottomplate(width=width, depth=depth);
};

// middle
if (middle) {
translate([0, -depth-10, 0]) {
  bodyMiddle(width=width, depth=depth, height=30, innerheight=30);
};
};

// UI-Mount
if (uiMount) {
translate([-130, 0, 0]) {
  displayMount(width=98, depth=58);
};
};

// Display Cover
if (displayCover2) {
translate([-130, 70, 0]) {
  displayCover2();
};
};

// Display Cover
if (displayCover) {
translate([-130, 70, 0]) {
  displayCover();
};
};

// Cable-Mount
if (cableMount) {
translate([0, 70, 0]) {
  cableMount();
};
};

// top
if (top) {
translate([-190, -depth-10, 0]) {
  bodyTop(width=width, depth=depth, height=15);
};
};

//slottedHole(diameter=4, length=10, height=4, border=2, angle=0);
//case(bottomThickness=2,wallThickness=2,width=width,depth=depth,height=height);
};

main();
